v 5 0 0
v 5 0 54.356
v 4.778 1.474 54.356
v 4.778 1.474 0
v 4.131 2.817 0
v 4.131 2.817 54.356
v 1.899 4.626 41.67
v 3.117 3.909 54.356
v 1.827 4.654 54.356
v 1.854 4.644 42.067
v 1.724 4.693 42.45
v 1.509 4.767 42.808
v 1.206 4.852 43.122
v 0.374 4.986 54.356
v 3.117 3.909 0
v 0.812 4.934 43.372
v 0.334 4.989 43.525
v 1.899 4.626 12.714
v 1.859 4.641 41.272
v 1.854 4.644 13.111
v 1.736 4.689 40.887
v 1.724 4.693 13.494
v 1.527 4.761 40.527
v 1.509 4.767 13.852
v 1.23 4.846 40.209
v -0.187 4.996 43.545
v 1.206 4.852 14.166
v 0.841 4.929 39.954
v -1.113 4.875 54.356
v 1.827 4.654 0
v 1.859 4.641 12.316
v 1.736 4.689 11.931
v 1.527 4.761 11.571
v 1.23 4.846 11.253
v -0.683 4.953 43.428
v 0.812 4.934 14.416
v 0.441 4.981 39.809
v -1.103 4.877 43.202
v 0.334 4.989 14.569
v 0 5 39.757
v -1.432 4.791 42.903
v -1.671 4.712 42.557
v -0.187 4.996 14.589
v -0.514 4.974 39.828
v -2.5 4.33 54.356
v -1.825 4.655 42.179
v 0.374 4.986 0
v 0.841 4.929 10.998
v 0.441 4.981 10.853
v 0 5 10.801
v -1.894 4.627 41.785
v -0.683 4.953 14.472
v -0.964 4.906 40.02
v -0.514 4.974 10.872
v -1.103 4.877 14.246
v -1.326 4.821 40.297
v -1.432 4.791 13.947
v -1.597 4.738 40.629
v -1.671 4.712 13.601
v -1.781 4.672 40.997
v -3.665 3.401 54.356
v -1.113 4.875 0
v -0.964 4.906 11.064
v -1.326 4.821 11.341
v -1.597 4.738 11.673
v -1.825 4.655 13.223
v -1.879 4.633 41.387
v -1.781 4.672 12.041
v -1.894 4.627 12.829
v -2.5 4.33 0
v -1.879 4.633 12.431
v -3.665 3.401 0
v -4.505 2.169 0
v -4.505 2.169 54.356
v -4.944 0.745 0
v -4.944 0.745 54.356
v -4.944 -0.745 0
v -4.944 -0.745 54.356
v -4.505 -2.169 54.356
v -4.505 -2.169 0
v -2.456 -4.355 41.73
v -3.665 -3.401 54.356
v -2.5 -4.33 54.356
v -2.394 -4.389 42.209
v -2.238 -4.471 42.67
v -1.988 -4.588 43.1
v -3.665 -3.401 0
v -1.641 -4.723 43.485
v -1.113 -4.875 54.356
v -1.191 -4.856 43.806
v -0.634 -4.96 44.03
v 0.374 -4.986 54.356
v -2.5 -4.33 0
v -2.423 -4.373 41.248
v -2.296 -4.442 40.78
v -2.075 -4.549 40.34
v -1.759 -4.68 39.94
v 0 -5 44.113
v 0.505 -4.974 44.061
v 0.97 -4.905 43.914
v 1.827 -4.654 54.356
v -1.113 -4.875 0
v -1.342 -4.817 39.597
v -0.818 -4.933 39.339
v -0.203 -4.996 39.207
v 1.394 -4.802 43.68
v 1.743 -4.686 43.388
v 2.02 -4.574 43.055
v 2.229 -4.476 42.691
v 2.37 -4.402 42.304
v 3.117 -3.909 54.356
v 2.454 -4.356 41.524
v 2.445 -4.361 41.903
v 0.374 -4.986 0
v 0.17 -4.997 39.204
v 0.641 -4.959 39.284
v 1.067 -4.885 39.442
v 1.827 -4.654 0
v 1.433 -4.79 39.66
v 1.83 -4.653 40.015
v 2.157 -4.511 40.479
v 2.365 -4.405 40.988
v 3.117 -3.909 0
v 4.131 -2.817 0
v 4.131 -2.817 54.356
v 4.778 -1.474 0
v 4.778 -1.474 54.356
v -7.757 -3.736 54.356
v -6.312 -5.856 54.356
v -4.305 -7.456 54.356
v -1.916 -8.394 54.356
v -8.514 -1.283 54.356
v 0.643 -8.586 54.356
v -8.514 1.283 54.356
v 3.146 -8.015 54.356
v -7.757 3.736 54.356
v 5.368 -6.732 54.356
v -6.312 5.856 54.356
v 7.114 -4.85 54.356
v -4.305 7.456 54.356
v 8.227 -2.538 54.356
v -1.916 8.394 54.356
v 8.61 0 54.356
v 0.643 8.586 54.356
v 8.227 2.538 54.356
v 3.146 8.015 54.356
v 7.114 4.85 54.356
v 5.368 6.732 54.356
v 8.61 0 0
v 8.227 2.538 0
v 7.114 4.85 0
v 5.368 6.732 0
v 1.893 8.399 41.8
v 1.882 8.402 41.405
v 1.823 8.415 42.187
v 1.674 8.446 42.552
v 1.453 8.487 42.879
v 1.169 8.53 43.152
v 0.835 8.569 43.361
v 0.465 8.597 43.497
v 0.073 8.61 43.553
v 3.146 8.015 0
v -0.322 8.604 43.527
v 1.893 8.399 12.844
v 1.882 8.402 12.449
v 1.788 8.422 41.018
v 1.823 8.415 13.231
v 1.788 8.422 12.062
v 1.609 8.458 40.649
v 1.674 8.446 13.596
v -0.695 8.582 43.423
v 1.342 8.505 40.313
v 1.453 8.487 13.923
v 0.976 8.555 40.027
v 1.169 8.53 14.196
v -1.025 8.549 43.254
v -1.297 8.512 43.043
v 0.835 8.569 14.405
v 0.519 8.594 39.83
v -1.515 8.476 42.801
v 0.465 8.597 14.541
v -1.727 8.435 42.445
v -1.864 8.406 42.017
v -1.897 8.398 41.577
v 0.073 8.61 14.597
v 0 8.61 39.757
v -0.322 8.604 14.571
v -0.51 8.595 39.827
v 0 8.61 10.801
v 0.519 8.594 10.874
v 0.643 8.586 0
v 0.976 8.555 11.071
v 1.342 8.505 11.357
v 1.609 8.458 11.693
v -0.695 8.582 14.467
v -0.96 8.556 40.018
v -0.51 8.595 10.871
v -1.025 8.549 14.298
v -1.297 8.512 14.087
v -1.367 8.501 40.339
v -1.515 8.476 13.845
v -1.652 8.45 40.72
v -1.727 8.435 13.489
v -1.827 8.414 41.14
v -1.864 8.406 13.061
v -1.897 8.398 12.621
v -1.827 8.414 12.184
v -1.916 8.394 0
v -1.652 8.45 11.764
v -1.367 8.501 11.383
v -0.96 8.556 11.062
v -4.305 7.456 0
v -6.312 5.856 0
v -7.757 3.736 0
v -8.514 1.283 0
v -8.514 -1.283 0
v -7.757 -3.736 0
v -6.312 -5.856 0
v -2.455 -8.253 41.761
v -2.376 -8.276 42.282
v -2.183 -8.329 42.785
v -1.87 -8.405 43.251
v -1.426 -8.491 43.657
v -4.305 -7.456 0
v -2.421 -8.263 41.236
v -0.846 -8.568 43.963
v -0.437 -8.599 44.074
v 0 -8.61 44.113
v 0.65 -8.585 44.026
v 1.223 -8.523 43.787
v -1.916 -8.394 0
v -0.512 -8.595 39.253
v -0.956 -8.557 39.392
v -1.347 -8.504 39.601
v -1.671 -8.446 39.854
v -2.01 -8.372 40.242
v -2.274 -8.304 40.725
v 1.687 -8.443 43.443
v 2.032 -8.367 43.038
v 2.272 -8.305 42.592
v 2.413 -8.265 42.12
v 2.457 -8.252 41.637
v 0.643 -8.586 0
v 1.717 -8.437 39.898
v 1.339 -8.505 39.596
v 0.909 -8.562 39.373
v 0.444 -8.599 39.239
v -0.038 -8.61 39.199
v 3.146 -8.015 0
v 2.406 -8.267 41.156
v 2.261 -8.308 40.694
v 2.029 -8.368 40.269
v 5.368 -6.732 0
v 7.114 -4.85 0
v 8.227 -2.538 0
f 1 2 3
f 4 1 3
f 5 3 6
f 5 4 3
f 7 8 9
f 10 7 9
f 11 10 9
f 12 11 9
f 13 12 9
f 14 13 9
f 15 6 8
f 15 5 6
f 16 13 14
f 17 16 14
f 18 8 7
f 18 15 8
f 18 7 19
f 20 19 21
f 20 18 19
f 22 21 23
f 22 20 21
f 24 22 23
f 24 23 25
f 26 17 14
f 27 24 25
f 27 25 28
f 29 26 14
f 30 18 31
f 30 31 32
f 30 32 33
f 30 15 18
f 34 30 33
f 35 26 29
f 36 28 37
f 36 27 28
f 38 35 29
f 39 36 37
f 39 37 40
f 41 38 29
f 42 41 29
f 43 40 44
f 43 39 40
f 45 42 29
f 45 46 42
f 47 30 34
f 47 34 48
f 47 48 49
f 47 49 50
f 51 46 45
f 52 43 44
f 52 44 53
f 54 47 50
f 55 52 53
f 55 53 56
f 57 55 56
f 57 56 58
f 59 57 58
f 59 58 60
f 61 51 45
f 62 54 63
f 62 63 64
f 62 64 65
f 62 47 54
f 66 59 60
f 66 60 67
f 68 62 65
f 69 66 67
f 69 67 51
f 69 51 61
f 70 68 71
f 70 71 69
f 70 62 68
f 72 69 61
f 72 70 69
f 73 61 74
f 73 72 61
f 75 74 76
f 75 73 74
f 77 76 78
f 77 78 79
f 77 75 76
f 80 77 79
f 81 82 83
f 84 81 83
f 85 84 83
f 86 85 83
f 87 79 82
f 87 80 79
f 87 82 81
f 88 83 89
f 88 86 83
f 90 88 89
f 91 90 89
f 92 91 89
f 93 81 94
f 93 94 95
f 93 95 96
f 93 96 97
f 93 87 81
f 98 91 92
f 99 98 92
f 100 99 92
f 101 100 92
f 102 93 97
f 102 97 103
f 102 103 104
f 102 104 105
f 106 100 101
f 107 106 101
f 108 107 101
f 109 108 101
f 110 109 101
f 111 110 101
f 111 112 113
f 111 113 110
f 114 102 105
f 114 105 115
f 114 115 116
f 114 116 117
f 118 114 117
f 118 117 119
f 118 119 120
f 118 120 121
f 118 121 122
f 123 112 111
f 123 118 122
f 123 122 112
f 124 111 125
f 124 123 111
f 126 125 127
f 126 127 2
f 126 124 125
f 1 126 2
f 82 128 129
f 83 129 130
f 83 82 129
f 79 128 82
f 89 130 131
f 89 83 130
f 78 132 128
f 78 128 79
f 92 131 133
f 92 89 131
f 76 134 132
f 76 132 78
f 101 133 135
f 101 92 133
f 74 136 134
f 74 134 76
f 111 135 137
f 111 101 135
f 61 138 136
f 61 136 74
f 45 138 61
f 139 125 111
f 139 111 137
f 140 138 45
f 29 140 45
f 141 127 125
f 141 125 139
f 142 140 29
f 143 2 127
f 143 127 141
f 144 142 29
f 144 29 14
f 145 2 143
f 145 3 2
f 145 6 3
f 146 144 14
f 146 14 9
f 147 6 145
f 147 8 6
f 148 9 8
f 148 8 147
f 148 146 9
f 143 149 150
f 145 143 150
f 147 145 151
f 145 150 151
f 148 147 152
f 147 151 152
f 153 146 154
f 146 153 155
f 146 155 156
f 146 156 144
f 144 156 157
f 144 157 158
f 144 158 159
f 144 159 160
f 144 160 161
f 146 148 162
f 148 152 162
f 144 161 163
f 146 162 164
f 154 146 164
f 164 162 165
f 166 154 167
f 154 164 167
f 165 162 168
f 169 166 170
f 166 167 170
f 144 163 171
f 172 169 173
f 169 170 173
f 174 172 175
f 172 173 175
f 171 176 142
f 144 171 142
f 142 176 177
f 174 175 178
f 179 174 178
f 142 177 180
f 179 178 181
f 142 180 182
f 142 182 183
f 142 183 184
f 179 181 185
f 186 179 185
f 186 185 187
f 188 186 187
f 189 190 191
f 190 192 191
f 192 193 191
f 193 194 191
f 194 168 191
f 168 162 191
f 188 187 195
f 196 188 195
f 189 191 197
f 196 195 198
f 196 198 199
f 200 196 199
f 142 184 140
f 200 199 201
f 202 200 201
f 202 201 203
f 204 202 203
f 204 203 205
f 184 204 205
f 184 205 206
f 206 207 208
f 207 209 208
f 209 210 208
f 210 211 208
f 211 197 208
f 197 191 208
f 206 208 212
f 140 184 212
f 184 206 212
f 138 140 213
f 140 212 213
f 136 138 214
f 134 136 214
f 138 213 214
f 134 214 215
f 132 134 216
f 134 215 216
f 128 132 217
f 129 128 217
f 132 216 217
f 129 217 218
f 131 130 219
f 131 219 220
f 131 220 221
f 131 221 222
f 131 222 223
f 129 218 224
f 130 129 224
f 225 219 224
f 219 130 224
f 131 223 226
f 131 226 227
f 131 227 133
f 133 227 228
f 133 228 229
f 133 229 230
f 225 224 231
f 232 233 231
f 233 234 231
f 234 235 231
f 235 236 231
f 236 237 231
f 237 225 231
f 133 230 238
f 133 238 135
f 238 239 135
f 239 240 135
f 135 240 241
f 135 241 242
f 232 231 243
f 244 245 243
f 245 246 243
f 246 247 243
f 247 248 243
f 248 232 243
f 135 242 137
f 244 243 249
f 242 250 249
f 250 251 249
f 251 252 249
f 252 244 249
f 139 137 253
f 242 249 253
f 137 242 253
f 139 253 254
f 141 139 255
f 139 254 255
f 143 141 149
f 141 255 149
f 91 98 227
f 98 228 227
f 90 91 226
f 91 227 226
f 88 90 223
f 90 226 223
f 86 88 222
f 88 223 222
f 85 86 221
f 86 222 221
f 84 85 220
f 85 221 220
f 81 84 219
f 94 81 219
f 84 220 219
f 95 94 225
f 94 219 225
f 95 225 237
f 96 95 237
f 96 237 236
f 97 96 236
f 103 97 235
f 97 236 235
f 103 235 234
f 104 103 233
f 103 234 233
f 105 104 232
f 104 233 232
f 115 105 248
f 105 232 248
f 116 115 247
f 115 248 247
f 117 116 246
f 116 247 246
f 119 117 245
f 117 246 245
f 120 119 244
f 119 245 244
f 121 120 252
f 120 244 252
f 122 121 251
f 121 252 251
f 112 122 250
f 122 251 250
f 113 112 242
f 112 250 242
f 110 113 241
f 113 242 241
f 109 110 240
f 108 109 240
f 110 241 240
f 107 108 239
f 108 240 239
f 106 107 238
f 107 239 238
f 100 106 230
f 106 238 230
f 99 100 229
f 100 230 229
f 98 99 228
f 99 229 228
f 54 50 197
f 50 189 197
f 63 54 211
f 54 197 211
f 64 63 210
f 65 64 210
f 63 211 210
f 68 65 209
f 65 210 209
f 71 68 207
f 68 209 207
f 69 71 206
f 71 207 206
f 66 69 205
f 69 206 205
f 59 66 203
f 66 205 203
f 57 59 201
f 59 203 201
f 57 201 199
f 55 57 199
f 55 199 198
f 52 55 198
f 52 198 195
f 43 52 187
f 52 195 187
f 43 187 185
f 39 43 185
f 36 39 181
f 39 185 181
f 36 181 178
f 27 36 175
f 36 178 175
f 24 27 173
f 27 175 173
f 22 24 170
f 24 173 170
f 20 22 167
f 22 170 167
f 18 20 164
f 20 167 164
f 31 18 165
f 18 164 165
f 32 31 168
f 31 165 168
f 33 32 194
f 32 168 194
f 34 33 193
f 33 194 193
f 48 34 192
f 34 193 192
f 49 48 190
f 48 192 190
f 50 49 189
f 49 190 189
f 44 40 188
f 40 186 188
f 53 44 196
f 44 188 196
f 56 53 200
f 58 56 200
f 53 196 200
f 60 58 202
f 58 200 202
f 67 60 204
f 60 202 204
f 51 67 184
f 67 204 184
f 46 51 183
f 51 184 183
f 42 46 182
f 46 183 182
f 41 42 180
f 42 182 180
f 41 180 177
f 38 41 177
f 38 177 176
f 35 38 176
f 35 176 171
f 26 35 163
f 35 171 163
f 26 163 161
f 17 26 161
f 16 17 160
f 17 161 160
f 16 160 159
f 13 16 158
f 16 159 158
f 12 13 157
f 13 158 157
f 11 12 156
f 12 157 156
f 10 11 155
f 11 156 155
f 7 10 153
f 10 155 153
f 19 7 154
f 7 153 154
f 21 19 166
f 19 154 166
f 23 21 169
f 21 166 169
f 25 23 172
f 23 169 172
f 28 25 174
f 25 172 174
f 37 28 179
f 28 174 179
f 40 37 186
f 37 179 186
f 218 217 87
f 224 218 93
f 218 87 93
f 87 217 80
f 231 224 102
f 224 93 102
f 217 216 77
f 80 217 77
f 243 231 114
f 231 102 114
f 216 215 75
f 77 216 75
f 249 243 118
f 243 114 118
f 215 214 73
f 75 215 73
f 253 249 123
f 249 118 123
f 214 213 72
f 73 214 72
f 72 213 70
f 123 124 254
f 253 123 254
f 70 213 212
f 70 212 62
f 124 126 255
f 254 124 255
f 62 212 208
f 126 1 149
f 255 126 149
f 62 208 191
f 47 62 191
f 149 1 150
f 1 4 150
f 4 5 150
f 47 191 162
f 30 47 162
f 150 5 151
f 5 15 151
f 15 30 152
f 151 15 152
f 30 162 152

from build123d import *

# Parameters (mm, degrees)
SKETCH1_R                       = 8.610000052
SKETCH1_R_2                     = 4.999999906
BOSS_EXTRUDE1_DEPTH             = 54.356
SKETCH2_W                       = 1.89865
SKETCH2_H                       = 8.610000052
F_10_24_TAPPED_HOLE1_AT_2_COUNT = 2
F_10_24_TAPPED_HOLE1_AT_2_PITCH = 28.956
SKETCH8_W                       = 2.45745
SKETCH8_H                       = 8.610000052


with BuildPart() as part:
    # Sketch1 → Boss-Extrude1 (new body)
    with BuildSketch(Plane.XY):
        Circle(SKETCH1_R)
        Circle(SKETCH1_R_2, mode=Mode.SUBTRACT)
    extrude(amount=BOSS_EXTRUDE1_DEPTH)

    # Sketch2 → #10-24 Tapped Hole1 (revolve, cut)
    with BuildSketch(Plane(origin=(0, 0, 12.7), x_dir=(0, 0, -1), z_dir=(1, 0, 0))):
        with Locations((0.949325, 4.305000026)):
            Rectangle(SKETCH2_W, SKETCH2_H)
    f_10_24_tapped_hole1 = revolve(axis=Axis((0, -6.35, 12.7), (0, 1, 0)), mode=Mode.SUBTRACT)

    # #10-24 Tapped Hole1 at 2: #10-24 Tapped Hole1 ×2
    with Locations(*[(0, 0, i * F_10_24_TAPPED_HOLE1_AT_2_PITCH) for i in range(1, F_10_24_TAPPED_HOLE1_AT_2_COUNT)]):
        add(f_10_24_tapped_hole1, mode=Mode.SUBTRACT)

    # Sketch8 → #10 (0.1935) Diameter Hole3 (revolve, cut)
    with BuildSketch(Plane(origin=(0, 0, 41.656), x_dir=(0, 0, 1), z_dir=(1, 0, 0))):
        with Locations((1.228725, 4.305000026)):
            Rectangle(SKETCH8_W, SKETCH8_H)
    revolve(axis=Axis((0, 6.35, 41.656), (0, -1, 0)), mode=Mode.SUBTRACT)


solid = part.part
